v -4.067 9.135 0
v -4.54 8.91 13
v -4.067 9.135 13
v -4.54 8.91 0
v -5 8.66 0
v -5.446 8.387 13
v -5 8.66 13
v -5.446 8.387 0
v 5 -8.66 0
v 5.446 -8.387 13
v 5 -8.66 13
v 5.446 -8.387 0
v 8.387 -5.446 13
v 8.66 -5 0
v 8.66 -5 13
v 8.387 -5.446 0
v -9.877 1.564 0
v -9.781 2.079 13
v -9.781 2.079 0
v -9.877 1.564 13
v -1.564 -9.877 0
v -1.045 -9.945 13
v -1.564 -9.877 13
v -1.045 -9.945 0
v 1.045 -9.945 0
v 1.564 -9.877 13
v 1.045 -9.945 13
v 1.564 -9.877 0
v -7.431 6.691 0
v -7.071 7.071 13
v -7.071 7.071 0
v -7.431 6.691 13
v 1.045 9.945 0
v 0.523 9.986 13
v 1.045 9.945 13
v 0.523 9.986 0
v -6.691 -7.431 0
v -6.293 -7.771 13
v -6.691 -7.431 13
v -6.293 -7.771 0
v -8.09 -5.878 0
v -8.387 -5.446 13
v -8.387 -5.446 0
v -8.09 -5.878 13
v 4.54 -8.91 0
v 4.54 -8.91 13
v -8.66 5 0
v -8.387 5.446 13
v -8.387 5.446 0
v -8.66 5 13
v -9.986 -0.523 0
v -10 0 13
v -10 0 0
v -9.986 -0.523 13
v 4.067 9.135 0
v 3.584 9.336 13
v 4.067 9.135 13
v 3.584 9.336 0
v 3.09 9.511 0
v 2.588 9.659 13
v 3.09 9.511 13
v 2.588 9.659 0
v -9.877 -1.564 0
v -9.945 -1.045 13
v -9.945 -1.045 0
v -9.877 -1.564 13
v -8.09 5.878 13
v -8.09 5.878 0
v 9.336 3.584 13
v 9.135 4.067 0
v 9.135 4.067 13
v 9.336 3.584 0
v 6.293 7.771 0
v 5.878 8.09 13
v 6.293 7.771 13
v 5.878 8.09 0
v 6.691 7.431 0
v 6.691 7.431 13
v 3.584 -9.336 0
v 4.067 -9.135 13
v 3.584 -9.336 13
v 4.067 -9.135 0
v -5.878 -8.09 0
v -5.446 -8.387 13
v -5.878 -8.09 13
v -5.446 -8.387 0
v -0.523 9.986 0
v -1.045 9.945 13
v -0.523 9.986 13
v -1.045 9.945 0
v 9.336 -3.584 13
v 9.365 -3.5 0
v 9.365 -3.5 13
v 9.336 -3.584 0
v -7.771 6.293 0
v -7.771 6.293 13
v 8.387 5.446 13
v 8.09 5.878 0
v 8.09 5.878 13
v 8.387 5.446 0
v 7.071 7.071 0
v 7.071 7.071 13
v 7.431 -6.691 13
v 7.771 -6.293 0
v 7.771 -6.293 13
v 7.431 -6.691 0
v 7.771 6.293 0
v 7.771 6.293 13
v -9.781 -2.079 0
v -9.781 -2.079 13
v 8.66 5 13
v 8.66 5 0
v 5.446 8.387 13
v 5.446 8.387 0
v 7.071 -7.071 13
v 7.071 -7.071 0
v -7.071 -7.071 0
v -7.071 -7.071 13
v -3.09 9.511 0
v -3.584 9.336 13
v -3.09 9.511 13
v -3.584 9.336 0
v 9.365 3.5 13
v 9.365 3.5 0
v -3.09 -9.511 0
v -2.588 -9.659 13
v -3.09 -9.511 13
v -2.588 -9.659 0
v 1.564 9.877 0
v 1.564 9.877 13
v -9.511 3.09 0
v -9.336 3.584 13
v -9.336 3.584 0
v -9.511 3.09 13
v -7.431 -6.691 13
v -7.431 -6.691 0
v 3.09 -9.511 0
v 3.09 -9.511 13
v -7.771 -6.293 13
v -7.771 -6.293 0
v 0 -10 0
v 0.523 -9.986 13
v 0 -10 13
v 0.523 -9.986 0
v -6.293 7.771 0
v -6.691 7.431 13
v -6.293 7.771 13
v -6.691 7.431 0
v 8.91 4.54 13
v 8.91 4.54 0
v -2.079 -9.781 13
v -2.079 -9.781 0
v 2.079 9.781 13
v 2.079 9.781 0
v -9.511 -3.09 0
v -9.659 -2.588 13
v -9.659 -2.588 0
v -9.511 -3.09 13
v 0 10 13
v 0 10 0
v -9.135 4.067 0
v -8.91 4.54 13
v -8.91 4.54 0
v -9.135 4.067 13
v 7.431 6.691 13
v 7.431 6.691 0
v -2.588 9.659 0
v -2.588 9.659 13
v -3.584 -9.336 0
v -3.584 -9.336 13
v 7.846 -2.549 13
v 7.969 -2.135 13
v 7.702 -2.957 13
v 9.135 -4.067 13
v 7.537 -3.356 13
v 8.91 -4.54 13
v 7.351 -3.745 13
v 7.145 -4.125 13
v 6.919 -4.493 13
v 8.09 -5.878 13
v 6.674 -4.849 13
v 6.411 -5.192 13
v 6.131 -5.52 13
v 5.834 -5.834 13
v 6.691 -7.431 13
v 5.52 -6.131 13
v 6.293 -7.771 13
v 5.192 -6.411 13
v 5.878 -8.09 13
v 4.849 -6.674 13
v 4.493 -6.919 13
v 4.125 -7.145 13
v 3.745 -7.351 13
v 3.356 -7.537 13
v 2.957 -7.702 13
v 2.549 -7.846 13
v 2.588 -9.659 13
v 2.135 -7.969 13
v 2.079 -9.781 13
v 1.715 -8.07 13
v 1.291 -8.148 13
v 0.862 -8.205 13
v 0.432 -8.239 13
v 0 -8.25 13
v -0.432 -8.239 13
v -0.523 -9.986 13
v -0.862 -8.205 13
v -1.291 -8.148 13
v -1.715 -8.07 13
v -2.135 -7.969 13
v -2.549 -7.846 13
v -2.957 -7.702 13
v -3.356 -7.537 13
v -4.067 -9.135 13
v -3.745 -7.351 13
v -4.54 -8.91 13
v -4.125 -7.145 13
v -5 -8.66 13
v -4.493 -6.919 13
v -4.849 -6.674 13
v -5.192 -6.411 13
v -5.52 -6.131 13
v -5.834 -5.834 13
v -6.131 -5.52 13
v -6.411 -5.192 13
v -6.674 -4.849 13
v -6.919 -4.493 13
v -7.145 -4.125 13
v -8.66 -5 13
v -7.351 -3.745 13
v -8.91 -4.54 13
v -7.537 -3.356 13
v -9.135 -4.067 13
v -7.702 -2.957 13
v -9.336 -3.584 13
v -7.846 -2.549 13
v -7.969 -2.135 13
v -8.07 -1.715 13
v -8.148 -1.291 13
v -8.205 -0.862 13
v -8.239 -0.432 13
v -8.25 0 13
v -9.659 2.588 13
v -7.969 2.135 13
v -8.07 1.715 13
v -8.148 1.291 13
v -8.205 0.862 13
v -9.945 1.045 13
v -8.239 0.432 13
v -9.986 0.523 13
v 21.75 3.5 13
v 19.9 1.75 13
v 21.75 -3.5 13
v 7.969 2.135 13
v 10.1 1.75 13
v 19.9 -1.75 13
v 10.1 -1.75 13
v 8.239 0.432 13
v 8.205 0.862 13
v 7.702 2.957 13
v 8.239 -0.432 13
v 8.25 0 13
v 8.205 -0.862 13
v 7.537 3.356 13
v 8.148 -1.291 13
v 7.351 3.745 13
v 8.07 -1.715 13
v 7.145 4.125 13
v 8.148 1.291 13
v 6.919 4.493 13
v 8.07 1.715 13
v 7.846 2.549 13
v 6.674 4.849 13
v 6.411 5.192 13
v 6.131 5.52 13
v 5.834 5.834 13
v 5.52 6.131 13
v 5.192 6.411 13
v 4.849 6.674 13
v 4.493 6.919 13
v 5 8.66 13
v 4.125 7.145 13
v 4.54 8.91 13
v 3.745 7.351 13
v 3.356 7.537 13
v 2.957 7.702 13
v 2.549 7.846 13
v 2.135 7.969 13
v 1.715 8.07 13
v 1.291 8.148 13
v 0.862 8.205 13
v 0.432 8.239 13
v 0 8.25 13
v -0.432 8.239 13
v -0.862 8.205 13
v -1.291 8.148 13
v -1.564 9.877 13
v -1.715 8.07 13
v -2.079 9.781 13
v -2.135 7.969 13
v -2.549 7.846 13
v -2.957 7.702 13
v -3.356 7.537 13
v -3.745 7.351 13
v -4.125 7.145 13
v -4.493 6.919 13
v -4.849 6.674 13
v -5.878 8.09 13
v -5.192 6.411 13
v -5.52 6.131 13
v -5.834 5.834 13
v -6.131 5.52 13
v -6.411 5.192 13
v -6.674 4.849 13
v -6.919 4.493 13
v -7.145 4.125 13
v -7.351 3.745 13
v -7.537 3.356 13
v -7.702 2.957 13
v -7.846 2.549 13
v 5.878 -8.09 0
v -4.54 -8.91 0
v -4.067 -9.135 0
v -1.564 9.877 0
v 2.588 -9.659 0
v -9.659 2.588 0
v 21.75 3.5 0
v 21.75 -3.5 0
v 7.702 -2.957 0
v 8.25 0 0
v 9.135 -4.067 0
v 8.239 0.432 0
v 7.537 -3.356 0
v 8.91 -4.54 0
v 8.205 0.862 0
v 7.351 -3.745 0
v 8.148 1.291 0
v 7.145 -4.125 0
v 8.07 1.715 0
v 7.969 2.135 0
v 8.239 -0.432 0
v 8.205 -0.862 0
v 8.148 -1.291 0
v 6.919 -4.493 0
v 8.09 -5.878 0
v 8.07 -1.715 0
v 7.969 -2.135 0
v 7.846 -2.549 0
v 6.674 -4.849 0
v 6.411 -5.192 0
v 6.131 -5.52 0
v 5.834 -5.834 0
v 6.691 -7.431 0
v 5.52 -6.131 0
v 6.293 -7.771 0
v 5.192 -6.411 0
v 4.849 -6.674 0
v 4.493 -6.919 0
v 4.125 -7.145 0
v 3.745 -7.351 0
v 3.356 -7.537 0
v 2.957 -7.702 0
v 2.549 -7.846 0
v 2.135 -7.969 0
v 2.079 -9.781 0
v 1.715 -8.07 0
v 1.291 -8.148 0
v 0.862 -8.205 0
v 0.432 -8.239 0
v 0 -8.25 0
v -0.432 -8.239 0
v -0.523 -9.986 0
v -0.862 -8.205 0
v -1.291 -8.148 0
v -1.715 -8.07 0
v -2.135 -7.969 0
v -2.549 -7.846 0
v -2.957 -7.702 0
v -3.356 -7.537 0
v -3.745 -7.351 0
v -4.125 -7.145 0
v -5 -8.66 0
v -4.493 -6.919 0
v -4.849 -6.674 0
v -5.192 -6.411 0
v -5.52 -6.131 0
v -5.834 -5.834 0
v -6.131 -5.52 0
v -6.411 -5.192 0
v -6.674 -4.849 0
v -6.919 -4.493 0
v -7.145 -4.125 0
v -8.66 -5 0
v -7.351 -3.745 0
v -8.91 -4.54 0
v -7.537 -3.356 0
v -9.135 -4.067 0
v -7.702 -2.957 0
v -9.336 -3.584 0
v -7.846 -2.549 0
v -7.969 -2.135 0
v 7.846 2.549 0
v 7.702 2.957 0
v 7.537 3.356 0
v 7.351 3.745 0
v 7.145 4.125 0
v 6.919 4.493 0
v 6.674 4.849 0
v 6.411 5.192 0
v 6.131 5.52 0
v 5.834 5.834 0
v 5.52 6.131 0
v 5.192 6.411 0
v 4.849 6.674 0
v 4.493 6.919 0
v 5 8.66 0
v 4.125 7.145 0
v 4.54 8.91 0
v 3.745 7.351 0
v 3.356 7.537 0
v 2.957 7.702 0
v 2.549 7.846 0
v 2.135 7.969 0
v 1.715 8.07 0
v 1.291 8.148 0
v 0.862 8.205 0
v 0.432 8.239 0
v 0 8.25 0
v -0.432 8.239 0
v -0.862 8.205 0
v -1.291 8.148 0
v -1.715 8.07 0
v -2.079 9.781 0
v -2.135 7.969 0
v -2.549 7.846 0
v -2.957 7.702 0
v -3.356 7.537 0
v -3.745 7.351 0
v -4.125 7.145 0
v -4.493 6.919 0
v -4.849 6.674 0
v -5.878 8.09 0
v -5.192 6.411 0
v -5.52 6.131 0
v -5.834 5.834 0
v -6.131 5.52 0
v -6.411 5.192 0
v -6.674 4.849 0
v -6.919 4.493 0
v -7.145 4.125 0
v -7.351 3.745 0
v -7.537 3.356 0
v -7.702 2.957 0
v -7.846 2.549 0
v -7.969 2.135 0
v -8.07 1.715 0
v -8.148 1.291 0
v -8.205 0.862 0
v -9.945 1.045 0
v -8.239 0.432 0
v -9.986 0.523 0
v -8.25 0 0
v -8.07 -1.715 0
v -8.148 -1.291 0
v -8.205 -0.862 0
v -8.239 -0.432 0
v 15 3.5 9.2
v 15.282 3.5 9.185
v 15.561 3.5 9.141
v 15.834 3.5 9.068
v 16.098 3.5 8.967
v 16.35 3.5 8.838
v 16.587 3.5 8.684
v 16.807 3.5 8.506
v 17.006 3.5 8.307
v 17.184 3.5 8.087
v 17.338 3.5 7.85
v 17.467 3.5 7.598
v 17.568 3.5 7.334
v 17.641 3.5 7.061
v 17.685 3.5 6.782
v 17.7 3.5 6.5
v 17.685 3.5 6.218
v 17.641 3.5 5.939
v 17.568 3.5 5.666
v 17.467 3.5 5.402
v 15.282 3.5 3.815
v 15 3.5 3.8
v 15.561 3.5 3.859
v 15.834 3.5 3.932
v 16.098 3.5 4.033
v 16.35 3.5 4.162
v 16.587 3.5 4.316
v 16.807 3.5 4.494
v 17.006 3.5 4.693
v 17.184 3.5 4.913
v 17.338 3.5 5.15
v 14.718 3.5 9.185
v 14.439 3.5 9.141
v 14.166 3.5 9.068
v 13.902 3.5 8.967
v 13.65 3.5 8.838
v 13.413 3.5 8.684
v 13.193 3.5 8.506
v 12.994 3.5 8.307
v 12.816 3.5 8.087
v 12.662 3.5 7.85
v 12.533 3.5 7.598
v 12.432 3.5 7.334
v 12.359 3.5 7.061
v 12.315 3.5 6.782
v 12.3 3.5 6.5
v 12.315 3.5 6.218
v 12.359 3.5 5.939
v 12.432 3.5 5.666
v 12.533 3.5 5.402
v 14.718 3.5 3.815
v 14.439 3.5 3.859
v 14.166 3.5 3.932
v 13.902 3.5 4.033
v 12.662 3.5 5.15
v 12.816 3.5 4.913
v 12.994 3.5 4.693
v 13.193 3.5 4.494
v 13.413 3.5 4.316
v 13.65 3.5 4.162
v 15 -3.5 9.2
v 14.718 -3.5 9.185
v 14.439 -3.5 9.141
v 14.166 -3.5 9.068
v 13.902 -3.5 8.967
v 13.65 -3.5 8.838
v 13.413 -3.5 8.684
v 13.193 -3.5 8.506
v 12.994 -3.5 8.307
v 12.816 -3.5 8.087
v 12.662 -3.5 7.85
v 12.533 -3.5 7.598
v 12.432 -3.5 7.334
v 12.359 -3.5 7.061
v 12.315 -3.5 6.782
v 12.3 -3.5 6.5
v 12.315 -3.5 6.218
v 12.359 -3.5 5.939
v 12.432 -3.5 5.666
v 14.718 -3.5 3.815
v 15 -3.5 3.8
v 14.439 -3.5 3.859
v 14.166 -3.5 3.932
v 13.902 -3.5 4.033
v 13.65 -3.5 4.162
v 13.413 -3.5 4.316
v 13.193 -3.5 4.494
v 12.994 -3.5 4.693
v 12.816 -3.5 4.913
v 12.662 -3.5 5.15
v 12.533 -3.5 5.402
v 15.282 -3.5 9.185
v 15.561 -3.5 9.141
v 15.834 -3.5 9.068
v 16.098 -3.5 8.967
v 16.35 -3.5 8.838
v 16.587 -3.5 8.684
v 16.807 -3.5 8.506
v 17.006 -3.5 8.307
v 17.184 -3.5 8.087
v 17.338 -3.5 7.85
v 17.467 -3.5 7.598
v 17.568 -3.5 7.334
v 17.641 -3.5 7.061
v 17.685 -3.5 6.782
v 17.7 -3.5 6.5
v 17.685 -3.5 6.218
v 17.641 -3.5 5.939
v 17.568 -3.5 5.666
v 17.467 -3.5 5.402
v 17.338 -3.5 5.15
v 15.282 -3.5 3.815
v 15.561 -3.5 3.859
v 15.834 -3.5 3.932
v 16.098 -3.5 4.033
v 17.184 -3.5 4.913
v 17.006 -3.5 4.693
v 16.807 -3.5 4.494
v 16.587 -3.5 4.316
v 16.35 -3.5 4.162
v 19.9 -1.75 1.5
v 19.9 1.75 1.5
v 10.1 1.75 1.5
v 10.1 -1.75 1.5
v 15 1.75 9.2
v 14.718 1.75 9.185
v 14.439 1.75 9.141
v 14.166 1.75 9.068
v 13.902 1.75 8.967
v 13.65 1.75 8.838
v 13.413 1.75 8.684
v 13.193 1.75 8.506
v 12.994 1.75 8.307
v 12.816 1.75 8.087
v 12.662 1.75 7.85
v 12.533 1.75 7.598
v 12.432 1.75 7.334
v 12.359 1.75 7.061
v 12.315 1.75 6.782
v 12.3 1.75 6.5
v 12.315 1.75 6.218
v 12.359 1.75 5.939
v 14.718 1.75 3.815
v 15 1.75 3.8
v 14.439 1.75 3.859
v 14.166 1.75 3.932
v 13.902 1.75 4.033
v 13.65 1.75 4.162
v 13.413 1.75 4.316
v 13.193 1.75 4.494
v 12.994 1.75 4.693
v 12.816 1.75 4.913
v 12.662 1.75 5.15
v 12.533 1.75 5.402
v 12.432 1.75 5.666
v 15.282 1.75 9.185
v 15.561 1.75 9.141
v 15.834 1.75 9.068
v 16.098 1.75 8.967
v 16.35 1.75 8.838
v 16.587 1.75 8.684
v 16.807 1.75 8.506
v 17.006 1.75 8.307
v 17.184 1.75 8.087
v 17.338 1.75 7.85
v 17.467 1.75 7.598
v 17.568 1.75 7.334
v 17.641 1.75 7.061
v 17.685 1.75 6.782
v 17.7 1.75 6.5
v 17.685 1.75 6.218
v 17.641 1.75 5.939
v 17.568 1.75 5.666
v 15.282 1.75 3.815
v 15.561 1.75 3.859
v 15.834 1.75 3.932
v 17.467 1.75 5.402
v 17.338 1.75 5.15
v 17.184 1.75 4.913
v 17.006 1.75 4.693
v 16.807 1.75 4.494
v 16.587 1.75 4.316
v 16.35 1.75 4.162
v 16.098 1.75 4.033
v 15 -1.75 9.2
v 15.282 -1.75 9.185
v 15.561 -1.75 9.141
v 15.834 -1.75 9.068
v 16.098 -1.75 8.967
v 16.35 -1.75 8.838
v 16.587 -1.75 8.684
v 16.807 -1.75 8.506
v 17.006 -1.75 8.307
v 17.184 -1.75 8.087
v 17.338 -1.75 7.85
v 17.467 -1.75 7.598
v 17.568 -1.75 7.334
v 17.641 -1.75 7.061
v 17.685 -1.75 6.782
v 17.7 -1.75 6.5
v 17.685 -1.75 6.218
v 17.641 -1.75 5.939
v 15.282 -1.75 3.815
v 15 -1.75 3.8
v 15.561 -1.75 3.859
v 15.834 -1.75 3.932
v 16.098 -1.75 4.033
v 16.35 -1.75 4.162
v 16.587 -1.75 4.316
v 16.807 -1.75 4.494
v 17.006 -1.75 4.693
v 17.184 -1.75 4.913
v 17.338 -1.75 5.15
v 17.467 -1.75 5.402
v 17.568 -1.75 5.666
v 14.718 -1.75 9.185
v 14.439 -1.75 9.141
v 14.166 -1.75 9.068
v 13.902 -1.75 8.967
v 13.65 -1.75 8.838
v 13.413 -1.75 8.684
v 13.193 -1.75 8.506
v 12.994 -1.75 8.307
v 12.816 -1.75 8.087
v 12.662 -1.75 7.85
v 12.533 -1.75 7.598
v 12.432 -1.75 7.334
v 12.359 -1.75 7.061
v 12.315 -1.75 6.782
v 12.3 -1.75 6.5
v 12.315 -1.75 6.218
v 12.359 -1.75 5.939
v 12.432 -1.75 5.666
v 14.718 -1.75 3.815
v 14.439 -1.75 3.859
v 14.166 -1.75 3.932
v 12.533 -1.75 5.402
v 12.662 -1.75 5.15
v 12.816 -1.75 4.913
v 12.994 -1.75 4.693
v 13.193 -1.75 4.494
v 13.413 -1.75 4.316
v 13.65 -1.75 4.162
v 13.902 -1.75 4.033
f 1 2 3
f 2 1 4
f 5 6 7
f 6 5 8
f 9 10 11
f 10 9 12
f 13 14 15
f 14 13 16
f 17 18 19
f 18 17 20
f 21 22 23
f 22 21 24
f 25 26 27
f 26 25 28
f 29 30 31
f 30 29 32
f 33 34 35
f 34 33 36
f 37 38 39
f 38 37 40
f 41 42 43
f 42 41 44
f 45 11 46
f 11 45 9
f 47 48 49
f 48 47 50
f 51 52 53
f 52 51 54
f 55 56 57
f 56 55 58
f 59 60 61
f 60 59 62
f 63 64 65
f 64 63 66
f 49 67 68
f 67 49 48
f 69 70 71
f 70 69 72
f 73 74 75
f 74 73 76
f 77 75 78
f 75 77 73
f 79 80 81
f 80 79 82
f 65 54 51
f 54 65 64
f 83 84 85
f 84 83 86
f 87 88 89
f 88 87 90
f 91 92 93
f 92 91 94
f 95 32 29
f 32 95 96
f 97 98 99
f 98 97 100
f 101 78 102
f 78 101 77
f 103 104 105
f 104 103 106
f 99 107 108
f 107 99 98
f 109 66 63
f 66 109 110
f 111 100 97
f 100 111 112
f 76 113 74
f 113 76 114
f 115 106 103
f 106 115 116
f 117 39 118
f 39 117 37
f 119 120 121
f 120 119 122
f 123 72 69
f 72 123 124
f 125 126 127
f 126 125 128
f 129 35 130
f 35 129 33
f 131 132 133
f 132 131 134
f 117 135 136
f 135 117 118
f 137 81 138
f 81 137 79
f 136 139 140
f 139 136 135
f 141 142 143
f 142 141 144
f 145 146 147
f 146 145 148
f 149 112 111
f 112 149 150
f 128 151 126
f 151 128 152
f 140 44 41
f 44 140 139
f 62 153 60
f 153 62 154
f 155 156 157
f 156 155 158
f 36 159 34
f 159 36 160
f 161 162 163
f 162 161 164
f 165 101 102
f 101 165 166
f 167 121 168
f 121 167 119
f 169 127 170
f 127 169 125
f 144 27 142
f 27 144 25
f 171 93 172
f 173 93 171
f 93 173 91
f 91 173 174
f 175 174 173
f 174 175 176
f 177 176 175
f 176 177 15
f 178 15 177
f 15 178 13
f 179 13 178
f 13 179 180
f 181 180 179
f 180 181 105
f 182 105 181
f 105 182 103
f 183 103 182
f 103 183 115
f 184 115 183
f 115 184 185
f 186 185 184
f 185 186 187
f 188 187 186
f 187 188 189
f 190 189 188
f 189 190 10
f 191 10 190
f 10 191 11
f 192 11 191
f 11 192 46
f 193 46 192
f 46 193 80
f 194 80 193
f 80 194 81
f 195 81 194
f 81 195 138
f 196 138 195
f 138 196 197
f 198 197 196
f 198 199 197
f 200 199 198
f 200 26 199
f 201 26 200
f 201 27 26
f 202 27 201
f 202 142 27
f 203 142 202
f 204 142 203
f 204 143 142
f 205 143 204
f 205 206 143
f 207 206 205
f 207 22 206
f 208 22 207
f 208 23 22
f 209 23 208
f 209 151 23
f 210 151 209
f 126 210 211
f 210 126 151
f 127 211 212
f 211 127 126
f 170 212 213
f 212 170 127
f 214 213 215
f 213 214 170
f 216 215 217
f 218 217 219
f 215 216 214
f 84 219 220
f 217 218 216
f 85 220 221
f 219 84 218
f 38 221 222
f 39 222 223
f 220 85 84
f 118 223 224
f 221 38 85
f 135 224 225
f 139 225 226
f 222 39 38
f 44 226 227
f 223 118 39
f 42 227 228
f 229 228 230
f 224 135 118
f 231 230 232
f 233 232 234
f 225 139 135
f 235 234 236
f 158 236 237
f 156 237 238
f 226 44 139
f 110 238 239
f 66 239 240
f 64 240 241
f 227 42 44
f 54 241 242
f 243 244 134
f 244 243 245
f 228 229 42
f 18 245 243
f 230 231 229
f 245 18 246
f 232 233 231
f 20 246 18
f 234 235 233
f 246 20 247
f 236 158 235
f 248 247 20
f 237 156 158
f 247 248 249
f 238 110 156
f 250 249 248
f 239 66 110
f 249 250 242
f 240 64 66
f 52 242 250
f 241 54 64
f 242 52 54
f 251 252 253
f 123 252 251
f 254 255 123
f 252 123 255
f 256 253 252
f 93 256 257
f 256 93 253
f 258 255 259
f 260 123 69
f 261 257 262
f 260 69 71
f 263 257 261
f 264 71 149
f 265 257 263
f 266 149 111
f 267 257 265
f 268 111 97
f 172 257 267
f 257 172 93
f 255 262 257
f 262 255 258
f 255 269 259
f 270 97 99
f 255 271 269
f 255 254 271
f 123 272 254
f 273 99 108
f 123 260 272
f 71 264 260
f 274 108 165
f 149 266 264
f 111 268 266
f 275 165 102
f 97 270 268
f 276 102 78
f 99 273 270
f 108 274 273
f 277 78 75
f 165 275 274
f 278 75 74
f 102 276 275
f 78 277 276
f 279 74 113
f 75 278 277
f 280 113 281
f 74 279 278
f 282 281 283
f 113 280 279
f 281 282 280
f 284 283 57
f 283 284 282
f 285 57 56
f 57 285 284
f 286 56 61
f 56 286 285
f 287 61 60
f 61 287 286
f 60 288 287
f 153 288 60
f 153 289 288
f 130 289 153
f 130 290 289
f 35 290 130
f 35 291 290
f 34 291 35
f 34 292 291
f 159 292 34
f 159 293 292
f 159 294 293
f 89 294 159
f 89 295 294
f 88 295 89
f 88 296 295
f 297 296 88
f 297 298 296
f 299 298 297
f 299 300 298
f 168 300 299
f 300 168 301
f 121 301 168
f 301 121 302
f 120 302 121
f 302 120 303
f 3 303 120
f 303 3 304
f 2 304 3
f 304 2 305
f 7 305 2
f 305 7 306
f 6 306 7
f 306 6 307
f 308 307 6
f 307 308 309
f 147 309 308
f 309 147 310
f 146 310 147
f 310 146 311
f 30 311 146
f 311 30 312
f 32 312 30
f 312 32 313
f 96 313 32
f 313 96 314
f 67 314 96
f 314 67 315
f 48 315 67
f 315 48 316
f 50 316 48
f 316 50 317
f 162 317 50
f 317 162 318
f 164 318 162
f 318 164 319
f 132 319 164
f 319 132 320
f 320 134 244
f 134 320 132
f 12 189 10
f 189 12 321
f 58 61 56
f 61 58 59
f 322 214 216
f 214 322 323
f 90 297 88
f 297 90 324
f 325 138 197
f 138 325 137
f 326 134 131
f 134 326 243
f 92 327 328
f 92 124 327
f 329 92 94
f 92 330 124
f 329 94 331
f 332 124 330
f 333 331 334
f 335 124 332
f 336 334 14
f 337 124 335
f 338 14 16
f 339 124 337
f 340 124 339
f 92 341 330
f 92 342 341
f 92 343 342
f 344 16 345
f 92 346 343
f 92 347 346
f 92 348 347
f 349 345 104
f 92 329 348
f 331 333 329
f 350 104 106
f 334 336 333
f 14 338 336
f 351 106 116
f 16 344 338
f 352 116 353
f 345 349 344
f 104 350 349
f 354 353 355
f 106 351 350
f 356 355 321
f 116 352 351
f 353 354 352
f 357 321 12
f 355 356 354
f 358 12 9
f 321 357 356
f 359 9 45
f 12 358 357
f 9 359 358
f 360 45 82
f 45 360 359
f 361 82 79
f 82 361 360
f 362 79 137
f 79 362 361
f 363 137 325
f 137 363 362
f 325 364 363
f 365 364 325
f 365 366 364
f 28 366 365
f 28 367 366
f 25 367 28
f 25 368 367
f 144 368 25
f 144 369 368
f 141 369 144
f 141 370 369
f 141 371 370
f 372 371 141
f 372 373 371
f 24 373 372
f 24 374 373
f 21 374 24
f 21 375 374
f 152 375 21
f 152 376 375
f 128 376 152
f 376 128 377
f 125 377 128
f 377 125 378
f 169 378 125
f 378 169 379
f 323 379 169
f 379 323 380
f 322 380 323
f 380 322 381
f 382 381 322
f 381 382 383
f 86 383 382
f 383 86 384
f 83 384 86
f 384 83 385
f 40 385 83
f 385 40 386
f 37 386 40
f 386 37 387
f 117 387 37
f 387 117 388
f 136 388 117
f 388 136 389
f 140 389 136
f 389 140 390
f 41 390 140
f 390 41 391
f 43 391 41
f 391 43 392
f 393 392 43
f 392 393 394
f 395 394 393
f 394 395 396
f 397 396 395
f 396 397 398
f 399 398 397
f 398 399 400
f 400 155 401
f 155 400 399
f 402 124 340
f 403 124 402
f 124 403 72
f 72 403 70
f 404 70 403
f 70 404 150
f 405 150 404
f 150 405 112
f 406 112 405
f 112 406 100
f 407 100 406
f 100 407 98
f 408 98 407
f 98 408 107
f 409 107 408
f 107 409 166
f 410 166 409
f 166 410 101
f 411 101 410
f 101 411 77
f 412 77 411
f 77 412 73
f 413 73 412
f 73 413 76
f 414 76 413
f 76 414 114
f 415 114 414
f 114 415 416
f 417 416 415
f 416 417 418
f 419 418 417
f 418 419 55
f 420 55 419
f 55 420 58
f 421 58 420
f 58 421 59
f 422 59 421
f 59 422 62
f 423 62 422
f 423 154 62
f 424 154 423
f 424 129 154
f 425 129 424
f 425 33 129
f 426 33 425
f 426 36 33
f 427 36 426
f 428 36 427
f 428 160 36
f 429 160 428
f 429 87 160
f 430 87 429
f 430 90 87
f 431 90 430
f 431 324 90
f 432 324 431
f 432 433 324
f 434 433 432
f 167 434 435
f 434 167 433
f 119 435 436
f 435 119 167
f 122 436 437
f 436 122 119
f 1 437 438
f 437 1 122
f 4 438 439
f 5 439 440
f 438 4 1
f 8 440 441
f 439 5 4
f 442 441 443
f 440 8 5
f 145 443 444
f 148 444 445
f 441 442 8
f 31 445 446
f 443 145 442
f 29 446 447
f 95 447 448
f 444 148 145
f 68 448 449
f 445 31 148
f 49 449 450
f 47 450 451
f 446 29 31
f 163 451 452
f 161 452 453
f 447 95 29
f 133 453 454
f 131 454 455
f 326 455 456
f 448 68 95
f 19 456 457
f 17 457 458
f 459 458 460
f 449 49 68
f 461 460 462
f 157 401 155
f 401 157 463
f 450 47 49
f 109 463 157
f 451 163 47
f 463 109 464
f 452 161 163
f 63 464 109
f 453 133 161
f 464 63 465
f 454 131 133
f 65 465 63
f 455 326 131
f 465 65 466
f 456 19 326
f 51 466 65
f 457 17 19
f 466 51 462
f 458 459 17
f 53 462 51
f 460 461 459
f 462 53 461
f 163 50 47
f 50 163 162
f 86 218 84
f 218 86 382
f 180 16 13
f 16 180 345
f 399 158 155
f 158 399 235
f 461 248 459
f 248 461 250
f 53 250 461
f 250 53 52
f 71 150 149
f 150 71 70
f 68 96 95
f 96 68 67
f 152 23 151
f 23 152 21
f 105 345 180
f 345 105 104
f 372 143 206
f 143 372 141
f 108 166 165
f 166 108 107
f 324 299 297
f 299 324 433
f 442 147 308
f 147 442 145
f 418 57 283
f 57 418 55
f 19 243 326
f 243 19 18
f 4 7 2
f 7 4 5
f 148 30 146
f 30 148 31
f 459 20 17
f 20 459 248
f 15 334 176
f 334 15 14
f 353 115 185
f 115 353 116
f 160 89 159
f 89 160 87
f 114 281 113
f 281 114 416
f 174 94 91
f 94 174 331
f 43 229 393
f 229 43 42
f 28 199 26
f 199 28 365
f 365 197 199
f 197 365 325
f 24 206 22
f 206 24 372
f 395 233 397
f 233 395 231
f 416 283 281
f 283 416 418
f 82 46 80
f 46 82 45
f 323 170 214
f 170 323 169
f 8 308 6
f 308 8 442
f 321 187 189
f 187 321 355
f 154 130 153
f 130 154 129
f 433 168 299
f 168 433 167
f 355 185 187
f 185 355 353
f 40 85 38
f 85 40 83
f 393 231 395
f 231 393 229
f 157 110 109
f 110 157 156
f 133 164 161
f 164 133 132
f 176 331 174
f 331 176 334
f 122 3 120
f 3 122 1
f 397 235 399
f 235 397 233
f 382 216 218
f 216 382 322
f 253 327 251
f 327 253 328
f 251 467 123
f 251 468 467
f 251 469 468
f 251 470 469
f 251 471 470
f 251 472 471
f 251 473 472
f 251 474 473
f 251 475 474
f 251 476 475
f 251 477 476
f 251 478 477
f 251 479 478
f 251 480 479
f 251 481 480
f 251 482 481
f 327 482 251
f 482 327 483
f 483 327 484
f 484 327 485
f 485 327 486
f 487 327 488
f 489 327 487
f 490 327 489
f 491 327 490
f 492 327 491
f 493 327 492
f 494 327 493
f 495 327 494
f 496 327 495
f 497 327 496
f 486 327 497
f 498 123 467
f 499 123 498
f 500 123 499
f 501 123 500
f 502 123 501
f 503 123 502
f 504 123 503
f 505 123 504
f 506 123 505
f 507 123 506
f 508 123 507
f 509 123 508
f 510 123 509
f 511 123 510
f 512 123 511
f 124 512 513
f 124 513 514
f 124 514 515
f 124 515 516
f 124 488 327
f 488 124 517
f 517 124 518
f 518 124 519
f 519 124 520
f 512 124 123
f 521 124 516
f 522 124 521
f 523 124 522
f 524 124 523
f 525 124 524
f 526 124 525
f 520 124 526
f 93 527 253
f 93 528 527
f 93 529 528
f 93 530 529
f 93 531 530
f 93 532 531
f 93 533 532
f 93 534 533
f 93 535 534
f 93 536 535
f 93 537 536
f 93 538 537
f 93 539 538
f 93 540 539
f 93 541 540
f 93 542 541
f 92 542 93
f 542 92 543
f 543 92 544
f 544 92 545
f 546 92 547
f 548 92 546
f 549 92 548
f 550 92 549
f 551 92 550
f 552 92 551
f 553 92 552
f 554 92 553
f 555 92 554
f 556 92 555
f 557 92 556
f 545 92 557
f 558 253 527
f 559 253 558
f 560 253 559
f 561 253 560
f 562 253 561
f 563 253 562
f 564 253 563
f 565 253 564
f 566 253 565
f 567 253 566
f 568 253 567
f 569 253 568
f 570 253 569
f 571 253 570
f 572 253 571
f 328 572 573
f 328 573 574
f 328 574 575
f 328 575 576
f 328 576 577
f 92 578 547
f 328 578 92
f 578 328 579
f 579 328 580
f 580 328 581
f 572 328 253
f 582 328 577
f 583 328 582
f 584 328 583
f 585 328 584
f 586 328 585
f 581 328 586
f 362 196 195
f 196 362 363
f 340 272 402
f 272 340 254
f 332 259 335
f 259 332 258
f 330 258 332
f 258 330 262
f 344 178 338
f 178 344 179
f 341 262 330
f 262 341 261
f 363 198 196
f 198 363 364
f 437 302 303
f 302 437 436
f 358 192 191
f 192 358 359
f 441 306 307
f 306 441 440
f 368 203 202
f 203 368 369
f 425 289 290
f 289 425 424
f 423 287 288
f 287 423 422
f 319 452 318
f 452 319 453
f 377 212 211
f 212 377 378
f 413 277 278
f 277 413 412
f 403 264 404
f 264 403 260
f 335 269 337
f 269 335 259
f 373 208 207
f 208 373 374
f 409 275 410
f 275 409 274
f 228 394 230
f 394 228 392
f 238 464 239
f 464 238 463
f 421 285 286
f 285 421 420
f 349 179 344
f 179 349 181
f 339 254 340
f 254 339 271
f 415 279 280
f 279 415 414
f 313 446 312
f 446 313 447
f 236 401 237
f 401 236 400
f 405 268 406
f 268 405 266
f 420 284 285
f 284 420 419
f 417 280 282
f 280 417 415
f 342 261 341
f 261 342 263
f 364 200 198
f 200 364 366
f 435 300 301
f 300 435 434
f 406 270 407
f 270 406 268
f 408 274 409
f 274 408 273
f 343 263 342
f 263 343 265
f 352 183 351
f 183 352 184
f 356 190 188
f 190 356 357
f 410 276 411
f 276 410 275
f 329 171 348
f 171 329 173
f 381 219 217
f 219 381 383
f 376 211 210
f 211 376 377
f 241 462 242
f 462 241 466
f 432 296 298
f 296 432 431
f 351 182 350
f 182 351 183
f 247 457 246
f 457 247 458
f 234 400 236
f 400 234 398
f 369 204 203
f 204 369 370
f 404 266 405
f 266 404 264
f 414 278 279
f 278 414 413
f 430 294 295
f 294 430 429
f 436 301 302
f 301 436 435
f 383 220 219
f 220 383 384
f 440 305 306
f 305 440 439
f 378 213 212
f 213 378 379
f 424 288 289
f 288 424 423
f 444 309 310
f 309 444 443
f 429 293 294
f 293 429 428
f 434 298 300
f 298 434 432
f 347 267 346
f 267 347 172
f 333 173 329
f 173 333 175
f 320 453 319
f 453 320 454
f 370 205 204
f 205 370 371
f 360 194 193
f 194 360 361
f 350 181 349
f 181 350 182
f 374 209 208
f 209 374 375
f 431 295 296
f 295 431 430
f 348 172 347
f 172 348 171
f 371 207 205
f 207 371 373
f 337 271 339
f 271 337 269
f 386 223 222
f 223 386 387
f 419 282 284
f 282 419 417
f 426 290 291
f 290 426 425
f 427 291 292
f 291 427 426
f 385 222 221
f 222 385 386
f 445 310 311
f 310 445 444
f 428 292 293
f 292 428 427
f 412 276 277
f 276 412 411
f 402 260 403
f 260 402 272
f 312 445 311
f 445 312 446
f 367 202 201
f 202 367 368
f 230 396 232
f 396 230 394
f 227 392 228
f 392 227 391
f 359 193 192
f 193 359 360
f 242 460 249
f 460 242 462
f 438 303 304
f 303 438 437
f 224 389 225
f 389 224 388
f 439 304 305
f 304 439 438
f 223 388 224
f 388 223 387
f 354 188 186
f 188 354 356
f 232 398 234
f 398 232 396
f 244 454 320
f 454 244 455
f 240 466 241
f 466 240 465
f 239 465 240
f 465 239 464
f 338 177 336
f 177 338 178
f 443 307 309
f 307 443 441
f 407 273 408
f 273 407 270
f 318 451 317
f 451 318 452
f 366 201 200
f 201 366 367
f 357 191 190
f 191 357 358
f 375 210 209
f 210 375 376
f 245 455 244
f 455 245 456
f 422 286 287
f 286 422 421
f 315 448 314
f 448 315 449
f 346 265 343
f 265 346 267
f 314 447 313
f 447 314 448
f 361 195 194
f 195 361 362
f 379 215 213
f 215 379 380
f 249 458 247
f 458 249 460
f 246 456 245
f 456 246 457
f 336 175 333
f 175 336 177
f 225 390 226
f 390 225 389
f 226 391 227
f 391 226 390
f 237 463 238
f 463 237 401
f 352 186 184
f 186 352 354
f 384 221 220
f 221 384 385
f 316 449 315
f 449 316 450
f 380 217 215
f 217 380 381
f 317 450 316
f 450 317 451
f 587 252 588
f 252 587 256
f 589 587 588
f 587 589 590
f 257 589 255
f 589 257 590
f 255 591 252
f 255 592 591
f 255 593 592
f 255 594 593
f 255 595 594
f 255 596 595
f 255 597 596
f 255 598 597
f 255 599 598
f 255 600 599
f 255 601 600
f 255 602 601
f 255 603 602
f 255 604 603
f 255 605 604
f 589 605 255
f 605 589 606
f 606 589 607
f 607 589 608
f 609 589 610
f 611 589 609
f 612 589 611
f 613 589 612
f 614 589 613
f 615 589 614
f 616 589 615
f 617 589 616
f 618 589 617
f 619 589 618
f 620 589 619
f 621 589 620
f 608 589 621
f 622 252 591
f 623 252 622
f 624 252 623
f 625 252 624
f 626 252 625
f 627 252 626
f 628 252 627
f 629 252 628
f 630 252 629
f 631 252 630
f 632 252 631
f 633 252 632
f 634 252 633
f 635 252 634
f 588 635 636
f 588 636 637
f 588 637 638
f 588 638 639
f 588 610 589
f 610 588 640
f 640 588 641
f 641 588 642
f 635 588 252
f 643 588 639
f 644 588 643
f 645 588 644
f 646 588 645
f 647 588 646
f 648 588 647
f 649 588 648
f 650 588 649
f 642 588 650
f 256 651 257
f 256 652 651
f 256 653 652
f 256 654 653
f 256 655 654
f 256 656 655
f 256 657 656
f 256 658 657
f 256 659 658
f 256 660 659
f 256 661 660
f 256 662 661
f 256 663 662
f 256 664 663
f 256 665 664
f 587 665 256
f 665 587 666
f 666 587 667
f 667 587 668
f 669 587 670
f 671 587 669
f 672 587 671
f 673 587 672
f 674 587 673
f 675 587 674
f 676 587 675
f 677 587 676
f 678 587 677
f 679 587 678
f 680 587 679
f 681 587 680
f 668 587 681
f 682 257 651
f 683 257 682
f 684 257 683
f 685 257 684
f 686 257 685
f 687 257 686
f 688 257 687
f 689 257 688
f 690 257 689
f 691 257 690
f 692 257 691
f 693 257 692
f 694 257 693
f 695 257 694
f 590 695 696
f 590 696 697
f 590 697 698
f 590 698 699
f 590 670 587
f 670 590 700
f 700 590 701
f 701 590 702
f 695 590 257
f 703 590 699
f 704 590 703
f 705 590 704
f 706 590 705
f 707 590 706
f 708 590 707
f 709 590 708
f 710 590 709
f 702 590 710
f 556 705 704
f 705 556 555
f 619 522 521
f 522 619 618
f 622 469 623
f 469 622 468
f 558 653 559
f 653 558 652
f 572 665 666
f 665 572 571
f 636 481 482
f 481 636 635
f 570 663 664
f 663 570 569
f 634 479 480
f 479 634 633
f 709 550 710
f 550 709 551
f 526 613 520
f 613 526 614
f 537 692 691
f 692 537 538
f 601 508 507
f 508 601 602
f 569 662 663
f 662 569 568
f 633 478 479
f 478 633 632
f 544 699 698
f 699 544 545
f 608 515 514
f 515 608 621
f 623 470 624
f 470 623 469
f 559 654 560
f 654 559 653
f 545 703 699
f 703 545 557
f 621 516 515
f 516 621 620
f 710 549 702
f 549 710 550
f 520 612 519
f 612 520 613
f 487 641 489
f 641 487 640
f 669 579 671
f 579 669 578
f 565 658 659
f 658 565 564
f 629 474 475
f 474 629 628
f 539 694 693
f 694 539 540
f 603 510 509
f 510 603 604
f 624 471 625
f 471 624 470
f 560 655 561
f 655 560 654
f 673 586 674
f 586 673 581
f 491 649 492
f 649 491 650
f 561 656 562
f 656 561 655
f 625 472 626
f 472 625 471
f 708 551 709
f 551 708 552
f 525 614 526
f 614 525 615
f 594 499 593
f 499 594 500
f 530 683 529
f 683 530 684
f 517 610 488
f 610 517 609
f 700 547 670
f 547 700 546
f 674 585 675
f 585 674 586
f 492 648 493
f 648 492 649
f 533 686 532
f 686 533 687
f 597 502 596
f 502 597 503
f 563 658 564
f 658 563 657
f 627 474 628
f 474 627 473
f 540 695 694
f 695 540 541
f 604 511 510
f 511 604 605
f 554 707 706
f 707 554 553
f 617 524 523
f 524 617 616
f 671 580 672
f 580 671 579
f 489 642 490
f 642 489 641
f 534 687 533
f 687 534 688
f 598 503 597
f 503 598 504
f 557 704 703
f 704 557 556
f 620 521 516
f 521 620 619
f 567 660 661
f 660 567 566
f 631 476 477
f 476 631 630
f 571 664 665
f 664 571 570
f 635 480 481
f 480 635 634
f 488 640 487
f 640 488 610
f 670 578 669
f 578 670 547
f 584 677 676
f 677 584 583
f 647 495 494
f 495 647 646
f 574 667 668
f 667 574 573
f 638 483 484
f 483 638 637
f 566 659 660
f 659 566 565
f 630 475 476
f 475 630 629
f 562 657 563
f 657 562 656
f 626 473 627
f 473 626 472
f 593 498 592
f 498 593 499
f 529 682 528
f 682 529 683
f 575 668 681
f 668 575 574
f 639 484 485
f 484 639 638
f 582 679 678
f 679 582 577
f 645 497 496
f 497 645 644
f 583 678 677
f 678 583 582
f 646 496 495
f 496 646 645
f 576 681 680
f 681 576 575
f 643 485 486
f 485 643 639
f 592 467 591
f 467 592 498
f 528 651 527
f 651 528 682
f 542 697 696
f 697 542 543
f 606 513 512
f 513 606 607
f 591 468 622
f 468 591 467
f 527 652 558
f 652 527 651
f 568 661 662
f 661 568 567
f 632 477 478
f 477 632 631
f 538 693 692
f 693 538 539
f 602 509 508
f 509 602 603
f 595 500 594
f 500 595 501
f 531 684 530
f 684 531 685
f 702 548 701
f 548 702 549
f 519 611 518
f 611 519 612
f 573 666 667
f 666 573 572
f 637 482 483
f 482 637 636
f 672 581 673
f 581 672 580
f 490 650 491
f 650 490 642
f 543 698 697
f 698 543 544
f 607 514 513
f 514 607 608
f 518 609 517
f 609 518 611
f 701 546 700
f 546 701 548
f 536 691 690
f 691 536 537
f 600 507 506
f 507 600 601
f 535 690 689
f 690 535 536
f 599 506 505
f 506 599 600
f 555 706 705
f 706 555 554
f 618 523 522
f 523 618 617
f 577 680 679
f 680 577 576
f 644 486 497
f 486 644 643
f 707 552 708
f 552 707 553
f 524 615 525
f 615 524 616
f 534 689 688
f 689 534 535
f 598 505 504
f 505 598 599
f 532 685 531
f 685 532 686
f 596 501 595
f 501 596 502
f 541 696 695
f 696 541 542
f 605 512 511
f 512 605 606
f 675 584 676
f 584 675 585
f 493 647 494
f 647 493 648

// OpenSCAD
// file: coax_sizes.scad
// hole radius for the pen
pen_hole_r = 6;

// outside radius of the tall center shaft.
ctr_outside_r = 8;
ctr_bottom_r = 16;
ctr_bottom_h = 3.5;

ring_outside_r = 10;
ring_body_w = 14.5;
ring_body_d = 7;
//ring_body_h = 15;
ring_cutout_d = 3.5;

nut_depth = 3.5;
nut_width = 9.8;

legs = 3;
leg_r = 2.5;
leg_h = 15;
leg_offset = 12;

nubs = 2;
nub_r = 1.25;

ring_h = 13;

rod_r = 2.7;
rod_up_from_base = 5;
// main file
include <coax_sizes.scad>

module coax_ring () {
        translate([0, 0, ring_h / 2])
        difference() {
                union() {
                        // sleeve
                        cylinder(h = ring_h, r = ring_outside_r, center = true, $fn=120);

                        // attachment body
                        translate([ring_body_w, 0, 0])
                                cube([ring_body_w, ring_body_d, ring_h], true);
                }

                // center hole
                cylinder(h = ring_h * 3, r = ctr_outside_r + .25, center = true, $fn=120);

                // nut cutout
                translate([ring_body_w + .5, 0, rod_up_from_base])
                        #cube([nut_width, nut_depth, rod_up_from_base * 4], true);

                // axle hole
                //translate([width/5, 0, 0]) rotate([0, 0, 0]) 
                translate([ring_body_w + .5, 0, 0])
                        rotate([90, 0, 0])
                        #cylinder(r=rod_r, h=20, center=true, $fn=60);
        }
}

coax_ring();
